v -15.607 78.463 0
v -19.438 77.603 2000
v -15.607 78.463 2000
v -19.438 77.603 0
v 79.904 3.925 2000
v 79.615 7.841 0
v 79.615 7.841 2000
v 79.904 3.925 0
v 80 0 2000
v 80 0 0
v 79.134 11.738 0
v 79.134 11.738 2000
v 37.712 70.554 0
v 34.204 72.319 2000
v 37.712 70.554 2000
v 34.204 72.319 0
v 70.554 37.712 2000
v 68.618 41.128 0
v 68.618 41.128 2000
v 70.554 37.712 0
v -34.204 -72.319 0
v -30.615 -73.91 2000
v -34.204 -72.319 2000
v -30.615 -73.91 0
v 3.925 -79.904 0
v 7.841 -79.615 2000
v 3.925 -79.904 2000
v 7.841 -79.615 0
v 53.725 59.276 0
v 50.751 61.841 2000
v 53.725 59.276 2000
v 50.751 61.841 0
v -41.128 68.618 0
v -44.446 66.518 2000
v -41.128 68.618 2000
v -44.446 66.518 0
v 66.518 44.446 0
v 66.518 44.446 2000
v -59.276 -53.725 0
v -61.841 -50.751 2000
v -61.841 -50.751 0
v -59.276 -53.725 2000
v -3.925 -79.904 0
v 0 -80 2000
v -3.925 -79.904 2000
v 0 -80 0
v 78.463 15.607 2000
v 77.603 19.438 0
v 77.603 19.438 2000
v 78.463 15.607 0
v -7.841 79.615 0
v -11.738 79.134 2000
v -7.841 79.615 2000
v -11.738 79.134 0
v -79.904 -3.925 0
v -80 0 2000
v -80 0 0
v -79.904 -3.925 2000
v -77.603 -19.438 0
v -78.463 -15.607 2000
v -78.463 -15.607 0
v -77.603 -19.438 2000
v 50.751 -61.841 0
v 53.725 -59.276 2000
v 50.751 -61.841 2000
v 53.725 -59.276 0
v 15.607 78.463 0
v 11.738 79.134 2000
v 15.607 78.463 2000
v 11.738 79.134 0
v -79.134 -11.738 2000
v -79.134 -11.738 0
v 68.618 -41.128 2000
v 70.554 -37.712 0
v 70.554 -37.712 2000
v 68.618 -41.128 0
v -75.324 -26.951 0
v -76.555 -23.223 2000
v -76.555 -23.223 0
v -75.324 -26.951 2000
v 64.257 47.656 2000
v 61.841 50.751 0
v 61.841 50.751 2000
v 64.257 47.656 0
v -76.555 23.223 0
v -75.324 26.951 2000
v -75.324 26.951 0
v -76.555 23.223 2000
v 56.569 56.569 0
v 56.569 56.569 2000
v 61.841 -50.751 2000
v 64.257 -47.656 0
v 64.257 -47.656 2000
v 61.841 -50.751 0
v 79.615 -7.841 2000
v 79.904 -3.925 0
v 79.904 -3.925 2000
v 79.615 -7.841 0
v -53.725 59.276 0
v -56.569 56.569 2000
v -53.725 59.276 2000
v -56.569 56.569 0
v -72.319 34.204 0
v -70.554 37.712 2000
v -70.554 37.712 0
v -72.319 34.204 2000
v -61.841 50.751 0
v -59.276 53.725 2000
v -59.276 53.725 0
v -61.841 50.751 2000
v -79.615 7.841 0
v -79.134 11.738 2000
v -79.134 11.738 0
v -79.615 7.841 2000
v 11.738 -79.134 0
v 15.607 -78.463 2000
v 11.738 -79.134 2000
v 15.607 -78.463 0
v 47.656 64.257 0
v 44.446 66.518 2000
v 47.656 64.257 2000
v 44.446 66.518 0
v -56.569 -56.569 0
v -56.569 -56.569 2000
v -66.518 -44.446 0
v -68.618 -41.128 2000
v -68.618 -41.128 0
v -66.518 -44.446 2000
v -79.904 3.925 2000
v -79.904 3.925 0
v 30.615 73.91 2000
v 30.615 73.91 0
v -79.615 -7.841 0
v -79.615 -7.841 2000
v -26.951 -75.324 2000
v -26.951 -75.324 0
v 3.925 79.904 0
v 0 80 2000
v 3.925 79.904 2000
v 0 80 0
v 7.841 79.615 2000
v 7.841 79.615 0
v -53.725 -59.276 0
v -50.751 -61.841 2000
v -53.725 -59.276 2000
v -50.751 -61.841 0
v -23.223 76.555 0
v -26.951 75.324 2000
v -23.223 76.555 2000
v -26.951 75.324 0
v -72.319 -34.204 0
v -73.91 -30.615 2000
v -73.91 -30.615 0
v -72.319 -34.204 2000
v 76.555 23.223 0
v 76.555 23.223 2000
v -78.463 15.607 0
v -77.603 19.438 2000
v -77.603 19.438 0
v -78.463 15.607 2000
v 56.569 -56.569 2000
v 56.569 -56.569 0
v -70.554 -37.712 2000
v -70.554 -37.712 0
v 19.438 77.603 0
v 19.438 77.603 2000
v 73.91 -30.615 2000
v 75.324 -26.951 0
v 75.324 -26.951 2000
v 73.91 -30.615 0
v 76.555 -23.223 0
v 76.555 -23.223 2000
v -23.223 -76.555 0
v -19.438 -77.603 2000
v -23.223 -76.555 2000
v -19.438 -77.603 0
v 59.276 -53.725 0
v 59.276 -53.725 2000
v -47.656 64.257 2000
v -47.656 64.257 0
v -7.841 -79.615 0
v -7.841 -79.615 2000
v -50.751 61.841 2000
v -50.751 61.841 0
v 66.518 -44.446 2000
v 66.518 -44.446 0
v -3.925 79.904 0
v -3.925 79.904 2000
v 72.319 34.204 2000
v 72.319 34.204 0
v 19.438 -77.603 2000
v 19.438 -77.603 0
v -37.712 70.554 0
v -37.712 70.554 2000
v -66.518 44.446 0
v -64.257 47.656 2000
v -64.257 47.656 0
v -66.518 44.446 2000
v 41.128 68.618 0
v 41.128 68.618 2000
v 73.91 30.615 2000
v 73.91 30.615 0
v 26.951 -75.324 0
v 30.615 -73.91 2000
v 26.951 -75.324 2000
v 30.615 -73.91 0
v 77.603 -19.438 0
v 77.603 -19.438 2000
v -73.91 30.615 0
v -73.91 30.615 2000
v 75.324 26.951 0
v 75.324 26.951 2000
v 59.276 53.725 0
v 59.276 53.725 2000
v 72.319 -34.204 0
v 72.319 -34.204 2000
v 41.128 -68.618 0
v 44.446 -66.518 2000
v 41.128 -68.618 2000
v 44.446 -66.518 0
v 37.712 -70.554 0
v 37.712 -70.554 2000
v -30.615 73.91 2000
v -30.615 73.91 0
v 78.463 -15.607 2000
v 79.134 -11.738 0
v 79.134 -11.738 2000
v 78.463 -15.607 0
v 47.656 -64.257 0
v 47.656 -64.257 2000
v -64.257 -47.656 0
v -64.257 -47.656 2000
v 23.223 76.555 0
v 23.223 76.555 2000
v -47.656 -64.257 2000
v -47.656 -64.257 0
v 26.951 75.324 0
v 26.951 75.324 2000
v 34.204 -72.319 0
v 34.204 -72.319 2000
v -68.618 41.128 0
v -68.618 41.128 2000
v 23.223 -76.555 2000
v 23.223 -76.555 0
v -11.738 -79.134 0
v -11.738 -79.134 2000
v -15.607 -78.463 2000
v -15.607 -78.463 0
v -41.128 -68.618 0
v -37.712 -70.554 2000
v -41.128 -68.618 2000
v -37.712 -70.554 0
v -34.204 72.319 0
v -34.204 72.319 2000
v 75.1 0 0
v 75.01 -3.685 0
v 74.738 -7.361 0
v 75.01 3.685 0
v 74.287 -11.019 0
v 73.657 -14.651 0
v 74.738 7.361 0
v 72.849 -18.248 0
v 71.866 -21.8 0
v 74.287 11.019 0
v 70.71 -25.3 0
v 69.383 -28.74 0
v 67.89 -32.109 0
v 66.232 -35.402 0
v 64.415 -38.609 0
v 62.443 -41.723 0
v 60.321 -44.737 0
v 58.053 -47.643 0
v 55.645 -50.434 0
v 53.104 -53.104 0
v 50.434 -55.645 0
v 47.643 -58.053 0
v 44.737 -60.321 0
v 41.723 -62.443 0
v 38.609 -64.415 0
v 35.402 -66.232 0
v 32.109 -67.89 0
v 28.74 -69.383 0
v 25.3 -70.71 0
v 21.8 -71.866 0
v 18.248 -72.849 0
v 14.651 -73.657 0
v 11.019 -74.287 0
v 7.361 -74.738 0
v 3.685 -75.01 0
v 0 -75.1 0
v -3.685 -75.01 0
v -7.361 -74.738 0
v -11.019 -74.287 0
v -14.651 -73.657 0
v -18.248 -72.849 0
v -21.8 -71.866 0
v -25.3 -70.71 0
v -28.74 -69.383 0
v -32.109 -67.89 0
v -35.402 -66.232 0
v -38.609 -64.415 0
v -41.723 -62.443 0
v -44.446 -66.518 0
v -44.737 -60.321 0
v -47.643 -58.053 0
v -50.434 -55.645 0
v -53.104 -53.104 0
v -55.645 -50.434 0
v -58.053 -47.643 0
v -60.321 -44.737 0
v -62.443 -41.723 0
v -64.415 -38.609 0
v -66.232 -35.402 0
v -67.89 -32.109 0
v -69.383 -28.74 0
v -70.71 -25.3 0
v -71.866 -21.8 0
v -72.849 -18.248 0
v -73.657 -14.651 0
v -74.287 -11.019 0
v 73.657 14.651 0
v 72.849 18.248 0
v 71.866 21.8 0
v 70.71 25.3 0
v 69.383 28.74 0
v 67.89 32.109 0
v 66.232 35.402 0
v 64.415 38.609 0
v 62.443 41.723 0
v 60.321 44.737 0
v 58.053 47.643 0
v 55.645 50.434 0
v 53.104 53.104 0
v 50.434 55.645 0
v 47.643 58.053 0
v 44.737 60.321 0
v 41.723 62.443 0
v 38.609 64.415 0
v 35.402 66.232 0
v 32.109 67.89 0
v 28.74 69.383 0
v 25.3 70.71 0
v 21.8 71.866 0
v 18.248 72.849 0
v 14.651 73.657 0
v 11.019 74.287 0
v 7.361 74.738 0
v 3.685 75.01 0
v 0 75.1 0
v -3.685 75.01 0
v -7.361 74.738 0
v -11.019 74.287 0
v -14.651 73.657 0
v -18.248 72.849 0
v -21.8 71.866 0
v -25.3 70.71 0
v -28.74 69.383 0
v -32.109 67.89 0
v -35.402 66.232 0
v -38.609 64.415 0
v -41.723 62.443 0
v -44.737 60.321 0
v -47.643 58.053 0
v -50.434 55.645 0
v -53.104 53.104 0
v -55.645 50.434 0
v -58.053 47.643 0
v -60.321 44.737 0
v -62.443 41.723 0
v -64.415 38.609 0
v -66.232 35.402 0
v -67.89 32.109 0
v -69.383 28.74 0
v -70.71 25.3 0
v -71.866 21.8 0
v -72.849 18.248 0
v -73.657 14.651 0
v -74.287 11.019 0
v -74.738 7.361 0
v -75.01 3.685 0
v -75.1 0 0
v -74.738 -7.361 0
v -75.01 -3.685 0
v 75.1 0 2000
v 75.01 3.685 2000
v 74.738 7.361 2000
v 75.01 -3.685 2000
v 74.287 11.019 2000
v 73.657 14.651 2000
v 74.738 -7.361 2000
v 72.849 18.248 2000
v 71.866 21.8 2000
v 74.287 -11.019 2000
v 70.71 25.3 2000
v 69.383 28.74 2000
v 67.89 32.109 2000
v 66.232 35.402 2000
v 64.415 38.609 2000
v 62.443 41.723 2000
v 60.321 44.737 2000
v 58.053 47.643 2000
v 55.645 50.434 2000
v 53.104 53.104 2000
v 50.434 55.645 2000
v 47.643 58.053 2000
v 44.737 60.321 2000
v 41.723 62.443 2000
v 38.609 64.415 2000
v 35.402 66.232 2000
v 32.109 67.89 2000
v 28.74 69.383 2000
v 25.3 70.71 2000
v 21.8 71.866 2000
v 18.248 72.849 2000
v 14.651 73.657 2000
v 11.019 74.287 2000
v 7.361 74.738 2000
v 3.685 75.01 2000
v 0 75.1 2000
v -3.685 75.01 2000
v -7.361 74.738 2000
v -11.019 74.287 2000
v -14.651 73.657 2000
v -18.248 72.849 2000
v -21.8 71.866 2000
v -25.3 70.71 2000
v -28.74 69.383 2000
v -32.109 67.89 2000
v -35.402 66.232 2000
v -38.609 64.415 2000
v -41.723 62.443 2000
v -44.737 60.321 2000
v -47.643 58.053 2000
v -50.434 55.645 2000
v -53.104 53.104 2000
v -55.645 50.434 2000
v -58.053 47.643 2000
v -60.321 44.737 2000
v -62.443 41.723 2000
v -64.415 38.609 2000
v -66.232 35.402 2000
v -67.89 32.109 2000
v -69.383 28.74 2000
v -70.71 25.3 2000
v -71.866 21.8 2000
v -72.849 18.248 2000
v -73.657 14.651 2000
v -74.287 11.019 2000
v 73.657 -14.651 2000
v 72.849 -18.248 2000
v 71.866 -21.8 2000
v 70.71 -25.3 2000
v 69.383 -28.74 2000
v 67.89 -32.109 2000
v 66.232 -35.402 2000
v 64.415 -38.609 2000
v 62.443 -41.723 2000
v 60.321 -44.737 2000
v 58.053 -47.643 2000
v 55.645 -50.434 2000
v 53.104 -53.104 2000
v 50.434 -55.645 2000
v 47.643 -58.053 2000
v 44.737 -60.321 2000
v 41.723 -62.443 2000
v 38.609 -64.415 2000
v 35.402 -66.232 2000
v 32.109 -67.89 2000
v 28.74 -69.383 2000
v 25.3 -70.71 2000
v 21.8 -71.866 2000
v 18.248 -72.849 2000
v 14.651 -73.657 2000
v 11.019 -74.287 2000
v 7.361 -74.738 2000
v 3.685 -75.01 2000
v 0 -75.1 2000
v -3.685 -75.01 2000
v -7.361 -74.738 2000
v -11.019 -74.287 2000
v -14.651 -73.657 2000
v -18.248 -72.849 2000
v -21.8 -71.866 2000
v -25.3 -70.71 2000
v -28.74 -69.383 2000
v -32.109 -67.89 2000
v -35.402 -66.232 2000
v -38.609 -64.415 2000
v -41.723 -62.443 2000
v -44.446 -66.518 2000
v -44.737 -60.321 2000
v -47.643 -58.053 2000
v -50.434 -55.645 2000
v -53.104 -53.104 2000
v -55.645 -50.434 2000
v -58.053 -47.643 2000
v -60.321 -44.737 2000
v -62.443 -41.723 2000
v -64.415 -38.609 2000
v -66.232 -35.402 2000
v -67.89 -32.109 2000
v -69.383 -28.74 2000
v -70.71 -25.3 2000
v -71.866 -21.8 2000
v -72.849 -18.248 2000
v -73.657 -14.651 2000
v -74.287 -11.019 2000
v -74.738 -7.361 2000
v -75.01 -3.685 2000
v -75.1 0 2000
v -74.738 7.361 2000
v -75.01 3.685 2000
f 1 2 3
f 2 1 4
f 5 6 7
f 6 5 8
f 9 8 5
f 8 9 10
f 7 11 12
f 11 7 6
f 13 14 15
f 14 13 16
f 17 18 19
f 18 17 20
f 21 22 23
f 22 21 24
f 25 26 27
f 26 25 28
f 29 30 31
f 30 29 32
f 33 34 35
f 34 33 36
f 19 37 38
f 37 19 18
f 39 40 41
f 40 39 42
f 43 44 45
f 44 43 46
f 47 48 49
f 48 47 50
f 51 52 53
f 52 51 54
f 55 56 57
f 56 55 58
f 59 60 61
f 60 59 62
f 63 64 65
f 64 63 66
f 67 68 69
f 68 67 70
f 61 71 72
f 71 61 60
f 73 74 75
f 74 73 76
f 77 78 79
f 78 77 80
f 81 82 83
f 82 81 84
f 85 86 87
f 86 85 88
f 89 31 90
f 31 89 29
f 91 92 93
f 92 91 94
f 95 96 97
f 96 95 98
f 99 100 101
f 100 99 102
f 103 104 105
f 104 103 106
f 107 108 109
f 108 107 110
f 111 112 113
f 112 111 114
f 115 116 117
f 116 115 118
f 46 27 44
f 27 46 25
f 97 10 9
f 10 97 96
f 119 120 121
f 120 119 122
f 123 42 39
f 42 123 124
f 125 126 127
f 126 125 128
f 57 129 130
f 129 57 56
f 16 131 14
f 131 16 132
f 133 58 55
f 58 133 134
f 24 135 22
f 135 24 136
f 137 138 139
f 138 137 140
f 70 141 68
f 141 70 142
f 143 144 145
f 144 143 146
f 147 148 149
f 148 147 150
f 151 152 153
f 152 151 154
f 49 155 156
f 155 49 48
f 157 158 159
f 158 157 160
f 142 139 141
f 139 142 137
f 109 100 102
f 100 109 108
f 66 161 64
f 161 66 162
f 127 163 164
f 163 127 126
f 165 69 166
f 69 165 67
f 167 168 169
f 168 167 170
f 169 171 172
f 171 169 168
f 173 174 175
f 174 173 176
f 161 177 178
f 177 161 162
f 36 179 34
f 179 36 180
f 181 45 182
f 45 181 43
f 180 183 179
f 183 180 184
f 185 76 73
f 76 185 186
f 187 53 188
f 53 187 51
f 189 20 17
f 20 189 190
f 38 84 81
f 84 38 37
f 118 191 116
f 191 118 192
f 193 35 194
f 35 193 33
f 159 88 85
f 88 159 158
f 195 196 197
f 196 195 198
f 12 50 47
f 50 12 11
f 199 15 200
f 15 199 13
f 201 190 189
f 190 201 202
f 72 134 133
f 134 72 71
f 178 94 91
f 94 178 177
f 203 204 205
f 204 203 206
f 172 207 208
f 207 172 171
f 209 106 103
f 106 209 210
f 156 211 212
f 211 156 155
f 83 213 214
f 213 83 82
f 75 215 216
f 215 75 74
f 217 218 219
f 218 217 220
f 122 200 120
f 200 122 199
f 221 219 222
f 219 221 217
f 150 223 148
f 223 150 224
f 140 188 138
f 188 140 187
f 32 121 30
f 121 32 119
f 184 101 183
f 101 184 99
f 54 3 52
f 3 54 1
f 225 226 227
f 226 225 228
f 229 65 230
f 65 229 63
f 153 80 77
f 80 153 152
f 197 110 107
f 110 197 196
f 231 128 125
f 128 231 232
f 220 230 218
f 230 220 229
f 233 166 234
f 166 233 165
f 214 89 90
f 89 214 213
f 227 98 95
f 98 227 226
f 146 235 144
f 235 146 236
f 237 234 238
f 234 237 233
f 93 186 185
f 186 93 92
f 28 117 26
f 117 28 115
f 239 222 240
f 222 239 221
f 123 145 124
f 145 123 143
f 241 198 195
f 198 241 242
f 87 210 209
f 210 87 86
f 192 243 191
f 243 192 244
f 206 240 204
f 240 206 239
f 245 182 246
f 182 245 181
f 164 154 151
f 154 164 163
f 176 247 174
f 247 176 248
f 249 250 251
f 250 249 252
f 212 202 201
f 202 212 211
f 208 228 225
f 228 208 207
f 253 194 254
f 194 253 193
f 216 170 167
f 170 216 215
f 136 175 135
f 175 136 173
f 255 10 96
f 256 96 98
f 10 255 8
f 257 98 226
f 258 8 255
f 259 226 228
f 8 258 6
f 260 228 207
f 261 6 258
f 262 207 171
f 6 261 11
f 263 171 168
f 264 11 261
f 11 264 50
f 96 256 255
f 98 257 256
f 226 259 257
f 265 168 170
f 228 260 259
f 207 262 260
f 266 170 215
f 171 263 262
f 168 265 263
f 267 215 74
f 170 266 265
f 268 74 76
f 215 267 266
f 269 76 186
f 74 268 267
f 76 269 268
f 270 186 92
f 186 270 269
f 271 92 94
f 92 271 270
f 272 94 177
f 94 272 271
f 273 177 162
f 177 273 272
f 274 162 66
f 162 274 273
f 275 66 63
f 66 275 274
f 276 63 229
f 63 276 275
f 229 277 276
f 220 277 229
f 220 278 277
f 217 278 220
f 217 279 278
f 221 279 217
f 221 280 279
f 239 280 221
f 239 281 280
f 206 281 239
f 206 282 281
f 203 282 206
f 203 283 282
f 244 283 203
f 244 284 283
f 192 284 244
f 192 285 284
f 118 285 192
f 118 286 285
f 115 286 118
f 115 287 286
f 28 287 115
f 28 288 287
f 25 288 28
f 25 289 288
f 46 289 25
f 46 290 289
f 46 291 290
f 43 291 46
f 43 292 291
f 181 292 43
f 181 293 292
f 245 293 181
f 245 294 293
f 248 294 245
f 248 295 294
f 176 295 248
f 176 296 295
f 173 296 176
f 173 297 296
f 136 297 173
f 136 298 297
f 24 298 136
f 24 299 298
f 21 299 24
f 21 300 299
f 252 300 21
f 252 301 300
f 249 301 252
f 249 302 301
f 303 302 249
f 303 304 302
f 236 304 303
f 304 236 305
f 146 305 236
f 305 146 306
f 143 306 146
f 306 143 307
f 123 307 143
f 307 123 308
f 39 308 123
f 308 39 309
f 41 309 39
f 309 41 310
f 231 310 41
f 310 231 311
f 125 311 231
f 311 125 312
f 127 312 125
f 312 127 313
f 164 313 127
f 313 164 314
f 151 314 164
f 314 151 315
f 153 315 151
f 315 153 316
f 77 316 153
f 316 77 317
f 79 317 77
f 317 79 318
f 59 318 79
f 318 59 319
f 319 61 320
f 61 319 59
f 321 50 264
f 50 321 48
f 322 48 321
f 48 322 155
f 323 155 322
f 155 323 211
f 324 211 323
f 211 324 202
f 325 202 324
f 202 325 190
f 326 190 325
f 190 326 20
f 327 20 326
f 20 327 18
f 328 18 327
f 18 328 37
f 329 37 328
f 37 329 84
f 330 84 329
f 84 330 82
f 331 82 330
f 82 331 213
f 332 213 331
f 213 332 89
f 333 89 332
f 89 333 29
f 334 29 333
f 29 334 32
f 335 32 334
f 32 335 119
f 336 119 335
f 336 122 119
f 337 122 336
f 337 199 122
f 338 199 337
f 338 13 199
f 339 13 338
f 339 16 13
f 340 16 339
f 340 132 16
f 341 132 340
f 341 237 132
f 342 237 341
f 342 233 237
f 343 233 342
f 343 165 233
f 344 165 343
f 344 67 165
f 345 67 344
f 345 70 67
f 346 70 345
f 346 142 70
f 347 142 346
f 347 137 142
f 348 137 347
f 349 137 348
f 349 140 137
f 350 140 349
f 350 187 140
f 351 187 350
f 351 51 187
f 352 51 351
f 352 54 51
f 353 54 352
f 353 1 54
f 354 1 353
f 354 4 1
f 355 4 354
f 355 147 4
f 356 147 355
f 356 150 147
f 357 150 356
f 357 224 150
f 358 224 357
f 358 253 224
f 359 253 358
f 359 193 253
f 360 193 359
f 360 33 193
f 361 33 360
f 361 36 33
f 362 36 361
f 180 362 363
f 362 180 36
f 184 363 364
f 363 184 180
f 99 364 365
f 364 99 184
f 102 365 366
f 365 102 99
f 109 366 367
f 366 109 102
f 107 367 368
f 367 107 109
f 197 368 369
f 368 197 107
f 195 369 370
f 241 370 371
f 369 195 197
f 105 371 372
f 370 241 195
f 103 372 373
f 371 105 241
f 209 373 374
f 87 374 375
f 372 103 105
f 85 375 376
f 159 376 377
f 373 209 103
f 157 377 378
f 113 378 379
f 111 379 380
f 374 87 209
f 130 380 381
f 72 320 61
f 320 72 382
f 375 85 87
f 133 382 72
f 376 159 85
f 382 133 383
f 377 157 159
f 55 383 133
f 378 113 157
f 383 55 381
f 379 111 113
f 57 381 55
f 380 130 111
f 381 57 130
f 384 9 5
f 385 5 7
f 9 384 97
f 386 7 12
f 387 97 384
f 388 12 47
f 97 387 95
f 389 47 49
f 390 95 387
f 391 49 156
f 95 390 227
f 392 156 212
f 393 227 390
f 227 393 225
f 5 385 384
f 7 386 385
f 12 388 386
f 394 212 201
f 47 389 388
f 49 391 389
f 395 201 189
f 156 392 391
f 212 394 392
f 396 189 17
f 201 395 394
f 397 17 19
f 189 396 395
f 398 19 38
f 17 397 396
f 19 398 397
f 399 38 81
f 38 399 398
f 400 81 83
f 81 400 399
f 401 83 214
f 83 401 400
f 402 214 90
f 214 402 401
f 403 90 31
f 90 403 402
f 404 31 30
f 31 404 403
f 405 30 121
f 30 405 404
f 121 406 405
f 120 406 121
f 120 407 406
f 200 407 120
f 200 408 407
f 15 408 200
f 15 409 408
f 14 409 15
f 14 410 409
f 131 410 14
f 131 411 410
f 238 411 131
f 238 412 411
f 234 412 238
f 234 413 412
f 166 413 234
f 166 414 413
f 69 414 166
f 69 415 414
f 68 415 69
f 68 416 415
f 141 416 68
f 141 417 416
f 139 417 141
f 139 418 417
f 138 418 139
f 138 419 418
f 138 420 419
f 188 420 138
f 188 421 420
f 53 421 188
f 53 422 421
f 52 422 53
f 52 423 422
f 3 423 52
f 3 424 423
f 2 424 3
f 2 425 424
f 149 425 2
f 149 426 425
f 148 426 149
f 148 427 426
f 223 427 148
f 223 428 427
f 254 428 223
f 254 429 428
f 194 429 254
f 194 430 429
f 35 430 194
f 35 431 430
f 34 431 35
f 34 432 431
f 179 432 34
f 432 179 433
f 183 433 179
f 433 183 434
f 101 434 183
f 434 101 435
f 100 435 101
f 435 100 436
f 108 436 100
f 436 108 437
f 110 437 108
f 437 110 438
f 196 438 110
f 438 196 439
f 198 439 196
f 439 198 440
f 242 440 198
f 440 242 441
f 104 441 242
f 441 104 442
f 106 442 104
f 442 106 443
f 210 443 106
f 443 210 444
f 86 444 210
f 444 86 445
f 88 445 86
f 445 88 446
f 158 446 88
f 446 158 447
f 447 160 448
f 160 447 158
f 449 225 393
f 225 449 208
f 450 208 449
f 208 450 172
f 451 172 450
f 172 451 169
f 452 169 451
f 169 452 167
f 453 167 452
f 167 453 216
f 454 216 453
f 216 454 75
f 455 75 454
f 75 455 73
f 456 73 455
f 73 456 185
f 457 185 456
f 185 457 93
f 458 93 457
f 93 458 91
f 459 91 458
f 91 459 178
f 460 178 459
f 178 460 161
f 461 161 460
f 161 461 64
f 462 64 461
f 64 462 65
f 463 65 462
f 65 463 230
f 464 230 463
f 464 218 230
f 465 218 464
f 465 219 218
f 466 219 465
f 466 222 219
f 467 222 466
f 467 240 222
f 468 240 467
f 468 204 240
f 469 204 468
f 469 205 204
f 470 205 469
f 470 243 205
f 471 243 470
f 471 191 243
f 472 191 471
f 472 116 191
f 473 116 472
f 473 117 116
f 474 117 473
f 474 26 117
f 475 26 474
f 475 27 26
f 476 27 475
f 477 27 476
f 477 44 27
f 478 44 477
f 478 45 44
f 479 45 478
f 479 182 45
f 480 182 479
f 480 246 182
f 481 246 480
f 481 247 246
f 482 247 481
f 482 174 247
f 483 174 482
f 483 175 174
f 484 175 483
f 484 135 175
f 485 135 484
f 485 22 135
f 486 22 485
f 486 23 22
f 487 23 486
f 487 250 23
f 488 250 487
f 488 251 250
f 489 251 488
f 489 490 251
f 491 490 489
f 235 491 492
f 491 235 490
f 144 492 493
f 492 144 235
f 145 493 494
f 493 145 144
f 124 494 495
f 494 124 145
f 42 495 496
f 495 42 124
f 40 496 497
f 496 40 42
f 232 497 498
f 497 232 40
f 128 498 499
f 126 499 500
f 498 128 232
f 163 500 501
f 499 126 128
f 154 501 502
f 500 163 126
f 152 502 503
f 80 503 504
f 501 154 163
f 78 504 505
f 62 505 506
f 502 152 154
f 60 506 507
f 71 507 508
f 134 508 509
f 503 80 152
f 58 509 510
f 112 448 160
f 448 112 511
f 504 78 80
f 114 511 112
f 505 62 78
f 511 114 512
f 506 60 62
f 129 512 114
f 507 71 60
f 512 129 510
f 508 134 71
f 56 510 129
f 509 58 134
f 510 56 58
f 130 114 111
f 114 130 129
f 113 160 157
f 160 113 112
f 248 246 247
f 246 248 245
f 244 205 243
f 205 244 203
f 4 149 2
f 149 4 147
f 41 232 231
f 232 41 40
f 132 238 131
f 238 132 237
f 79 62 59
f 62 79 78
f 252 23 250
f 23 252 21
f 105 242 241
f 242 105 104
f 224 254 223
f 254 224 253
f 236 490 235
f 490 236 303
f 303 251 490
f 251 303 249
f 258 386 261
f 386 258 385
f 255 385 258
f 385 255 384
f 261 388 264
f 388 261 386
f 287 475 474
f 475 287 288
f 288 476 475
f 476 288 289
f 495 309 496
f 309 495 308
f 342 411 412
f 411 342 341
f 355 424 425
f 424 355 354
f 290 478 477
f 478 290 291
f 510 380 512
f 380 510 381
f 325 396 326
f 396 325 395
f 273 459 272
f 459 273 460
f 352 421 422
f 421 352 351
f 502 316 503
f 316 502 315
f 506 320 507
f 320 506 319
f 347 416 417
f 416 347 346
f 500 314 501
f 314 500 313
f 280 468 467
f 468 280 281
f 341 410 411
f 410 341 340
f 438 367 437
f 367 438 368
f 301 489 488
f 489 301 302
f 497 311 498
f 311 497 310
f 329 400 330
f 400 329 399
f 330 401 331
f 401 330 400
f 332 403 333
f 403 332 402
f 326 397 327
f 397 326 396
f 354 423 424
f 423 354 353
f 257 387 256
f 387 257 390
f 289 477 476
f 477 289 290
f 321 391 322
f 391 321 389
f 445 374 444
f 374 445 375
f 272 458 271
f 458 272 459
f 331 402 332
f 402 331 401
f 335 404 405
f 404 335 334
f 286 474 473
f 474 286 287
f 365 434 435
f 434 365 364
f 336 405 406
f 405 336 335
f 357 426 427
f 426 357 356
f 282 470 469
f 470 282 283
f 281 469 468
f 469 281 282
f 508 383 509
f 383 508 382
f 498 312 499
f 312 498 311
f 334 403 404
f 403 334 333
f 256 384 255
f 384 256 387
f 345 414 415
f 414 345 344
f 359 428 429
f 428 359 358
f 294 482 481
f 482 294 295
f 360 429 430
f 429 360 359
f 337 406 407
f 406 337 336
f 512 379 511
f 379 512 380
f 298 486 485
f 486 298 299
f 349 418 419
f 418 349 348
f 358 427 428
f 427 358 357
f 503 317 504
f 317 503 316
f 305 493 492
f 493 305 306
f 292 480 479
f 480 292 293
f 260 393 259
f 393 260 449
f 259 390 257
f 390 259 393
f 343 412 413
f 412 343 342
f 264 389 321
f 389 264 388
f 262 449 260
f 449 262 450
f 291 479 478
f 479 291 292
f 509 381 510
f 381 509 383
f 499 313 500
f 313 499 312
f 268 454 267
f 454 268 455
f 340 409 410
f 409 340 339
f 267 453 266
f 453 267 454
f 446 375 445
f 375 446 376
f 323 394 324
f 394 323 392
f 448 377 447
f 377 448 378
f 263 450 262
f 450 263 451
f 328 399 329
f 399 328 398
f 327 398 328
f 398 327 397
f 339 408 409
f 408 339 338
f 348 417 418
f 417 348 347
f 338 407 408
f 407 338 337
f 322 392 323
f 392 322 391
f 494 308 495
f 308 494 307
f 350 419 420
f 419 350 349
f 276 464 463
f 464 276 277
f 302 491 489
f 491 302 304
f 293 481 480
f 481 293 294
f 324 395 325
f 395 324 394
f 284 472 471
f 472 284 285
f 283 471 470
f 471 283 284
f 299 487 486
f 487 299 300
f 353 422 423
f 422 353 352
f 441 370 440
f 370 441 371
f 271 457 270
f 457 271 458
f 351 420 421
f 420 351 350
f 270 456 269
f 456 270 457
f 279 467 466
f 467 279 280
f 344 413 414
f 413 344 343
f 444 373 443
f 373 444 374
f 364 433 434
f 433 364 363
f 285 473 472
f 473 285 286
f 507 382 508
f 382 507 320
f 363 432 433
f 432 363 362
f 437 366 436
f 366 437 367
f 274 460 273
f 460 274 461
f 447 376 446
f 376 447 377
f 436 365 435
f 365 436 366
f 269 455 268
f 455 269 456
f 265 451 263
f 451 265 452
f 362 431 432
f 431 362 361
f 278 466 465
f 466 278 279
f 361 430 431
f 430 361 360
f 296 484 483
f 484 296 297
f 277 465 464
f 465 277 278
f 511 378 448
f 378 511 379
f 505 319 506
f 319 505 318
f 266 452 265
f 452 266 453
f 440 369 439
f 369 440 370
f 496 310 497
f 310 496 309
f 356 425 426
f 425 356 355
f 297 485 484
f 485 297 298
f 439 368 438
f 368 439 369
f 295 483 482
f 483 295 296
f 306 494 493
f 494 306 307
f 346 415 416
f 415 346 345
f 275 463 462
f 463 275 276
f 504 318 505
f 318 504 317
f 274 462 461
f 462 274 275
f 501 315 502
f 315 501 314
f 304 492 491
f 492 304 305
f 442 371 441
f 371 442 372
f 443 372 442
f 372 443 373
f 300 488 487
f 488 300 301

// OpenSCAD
$fn = 128;

// HT pipe parameters (mm)
outer_d = 160;
length  = 2000;

// Typical HT (house drainage) wall thickness for DN160 is ~4.9 mm.
// Adjust if you need a different standard.
wall_th = 4.9;

inner_d = outer_d - 2*wall_th;

module ht_pipe(od, id, L) {
    difference() {
        cylinder(h = L, d = od, center = false);
        translate([0,0,-0.5])
            cylinder(h = L + 1, d = id, center = false);
    }
}

ht_pipe(outer_d, inner_d, length);
